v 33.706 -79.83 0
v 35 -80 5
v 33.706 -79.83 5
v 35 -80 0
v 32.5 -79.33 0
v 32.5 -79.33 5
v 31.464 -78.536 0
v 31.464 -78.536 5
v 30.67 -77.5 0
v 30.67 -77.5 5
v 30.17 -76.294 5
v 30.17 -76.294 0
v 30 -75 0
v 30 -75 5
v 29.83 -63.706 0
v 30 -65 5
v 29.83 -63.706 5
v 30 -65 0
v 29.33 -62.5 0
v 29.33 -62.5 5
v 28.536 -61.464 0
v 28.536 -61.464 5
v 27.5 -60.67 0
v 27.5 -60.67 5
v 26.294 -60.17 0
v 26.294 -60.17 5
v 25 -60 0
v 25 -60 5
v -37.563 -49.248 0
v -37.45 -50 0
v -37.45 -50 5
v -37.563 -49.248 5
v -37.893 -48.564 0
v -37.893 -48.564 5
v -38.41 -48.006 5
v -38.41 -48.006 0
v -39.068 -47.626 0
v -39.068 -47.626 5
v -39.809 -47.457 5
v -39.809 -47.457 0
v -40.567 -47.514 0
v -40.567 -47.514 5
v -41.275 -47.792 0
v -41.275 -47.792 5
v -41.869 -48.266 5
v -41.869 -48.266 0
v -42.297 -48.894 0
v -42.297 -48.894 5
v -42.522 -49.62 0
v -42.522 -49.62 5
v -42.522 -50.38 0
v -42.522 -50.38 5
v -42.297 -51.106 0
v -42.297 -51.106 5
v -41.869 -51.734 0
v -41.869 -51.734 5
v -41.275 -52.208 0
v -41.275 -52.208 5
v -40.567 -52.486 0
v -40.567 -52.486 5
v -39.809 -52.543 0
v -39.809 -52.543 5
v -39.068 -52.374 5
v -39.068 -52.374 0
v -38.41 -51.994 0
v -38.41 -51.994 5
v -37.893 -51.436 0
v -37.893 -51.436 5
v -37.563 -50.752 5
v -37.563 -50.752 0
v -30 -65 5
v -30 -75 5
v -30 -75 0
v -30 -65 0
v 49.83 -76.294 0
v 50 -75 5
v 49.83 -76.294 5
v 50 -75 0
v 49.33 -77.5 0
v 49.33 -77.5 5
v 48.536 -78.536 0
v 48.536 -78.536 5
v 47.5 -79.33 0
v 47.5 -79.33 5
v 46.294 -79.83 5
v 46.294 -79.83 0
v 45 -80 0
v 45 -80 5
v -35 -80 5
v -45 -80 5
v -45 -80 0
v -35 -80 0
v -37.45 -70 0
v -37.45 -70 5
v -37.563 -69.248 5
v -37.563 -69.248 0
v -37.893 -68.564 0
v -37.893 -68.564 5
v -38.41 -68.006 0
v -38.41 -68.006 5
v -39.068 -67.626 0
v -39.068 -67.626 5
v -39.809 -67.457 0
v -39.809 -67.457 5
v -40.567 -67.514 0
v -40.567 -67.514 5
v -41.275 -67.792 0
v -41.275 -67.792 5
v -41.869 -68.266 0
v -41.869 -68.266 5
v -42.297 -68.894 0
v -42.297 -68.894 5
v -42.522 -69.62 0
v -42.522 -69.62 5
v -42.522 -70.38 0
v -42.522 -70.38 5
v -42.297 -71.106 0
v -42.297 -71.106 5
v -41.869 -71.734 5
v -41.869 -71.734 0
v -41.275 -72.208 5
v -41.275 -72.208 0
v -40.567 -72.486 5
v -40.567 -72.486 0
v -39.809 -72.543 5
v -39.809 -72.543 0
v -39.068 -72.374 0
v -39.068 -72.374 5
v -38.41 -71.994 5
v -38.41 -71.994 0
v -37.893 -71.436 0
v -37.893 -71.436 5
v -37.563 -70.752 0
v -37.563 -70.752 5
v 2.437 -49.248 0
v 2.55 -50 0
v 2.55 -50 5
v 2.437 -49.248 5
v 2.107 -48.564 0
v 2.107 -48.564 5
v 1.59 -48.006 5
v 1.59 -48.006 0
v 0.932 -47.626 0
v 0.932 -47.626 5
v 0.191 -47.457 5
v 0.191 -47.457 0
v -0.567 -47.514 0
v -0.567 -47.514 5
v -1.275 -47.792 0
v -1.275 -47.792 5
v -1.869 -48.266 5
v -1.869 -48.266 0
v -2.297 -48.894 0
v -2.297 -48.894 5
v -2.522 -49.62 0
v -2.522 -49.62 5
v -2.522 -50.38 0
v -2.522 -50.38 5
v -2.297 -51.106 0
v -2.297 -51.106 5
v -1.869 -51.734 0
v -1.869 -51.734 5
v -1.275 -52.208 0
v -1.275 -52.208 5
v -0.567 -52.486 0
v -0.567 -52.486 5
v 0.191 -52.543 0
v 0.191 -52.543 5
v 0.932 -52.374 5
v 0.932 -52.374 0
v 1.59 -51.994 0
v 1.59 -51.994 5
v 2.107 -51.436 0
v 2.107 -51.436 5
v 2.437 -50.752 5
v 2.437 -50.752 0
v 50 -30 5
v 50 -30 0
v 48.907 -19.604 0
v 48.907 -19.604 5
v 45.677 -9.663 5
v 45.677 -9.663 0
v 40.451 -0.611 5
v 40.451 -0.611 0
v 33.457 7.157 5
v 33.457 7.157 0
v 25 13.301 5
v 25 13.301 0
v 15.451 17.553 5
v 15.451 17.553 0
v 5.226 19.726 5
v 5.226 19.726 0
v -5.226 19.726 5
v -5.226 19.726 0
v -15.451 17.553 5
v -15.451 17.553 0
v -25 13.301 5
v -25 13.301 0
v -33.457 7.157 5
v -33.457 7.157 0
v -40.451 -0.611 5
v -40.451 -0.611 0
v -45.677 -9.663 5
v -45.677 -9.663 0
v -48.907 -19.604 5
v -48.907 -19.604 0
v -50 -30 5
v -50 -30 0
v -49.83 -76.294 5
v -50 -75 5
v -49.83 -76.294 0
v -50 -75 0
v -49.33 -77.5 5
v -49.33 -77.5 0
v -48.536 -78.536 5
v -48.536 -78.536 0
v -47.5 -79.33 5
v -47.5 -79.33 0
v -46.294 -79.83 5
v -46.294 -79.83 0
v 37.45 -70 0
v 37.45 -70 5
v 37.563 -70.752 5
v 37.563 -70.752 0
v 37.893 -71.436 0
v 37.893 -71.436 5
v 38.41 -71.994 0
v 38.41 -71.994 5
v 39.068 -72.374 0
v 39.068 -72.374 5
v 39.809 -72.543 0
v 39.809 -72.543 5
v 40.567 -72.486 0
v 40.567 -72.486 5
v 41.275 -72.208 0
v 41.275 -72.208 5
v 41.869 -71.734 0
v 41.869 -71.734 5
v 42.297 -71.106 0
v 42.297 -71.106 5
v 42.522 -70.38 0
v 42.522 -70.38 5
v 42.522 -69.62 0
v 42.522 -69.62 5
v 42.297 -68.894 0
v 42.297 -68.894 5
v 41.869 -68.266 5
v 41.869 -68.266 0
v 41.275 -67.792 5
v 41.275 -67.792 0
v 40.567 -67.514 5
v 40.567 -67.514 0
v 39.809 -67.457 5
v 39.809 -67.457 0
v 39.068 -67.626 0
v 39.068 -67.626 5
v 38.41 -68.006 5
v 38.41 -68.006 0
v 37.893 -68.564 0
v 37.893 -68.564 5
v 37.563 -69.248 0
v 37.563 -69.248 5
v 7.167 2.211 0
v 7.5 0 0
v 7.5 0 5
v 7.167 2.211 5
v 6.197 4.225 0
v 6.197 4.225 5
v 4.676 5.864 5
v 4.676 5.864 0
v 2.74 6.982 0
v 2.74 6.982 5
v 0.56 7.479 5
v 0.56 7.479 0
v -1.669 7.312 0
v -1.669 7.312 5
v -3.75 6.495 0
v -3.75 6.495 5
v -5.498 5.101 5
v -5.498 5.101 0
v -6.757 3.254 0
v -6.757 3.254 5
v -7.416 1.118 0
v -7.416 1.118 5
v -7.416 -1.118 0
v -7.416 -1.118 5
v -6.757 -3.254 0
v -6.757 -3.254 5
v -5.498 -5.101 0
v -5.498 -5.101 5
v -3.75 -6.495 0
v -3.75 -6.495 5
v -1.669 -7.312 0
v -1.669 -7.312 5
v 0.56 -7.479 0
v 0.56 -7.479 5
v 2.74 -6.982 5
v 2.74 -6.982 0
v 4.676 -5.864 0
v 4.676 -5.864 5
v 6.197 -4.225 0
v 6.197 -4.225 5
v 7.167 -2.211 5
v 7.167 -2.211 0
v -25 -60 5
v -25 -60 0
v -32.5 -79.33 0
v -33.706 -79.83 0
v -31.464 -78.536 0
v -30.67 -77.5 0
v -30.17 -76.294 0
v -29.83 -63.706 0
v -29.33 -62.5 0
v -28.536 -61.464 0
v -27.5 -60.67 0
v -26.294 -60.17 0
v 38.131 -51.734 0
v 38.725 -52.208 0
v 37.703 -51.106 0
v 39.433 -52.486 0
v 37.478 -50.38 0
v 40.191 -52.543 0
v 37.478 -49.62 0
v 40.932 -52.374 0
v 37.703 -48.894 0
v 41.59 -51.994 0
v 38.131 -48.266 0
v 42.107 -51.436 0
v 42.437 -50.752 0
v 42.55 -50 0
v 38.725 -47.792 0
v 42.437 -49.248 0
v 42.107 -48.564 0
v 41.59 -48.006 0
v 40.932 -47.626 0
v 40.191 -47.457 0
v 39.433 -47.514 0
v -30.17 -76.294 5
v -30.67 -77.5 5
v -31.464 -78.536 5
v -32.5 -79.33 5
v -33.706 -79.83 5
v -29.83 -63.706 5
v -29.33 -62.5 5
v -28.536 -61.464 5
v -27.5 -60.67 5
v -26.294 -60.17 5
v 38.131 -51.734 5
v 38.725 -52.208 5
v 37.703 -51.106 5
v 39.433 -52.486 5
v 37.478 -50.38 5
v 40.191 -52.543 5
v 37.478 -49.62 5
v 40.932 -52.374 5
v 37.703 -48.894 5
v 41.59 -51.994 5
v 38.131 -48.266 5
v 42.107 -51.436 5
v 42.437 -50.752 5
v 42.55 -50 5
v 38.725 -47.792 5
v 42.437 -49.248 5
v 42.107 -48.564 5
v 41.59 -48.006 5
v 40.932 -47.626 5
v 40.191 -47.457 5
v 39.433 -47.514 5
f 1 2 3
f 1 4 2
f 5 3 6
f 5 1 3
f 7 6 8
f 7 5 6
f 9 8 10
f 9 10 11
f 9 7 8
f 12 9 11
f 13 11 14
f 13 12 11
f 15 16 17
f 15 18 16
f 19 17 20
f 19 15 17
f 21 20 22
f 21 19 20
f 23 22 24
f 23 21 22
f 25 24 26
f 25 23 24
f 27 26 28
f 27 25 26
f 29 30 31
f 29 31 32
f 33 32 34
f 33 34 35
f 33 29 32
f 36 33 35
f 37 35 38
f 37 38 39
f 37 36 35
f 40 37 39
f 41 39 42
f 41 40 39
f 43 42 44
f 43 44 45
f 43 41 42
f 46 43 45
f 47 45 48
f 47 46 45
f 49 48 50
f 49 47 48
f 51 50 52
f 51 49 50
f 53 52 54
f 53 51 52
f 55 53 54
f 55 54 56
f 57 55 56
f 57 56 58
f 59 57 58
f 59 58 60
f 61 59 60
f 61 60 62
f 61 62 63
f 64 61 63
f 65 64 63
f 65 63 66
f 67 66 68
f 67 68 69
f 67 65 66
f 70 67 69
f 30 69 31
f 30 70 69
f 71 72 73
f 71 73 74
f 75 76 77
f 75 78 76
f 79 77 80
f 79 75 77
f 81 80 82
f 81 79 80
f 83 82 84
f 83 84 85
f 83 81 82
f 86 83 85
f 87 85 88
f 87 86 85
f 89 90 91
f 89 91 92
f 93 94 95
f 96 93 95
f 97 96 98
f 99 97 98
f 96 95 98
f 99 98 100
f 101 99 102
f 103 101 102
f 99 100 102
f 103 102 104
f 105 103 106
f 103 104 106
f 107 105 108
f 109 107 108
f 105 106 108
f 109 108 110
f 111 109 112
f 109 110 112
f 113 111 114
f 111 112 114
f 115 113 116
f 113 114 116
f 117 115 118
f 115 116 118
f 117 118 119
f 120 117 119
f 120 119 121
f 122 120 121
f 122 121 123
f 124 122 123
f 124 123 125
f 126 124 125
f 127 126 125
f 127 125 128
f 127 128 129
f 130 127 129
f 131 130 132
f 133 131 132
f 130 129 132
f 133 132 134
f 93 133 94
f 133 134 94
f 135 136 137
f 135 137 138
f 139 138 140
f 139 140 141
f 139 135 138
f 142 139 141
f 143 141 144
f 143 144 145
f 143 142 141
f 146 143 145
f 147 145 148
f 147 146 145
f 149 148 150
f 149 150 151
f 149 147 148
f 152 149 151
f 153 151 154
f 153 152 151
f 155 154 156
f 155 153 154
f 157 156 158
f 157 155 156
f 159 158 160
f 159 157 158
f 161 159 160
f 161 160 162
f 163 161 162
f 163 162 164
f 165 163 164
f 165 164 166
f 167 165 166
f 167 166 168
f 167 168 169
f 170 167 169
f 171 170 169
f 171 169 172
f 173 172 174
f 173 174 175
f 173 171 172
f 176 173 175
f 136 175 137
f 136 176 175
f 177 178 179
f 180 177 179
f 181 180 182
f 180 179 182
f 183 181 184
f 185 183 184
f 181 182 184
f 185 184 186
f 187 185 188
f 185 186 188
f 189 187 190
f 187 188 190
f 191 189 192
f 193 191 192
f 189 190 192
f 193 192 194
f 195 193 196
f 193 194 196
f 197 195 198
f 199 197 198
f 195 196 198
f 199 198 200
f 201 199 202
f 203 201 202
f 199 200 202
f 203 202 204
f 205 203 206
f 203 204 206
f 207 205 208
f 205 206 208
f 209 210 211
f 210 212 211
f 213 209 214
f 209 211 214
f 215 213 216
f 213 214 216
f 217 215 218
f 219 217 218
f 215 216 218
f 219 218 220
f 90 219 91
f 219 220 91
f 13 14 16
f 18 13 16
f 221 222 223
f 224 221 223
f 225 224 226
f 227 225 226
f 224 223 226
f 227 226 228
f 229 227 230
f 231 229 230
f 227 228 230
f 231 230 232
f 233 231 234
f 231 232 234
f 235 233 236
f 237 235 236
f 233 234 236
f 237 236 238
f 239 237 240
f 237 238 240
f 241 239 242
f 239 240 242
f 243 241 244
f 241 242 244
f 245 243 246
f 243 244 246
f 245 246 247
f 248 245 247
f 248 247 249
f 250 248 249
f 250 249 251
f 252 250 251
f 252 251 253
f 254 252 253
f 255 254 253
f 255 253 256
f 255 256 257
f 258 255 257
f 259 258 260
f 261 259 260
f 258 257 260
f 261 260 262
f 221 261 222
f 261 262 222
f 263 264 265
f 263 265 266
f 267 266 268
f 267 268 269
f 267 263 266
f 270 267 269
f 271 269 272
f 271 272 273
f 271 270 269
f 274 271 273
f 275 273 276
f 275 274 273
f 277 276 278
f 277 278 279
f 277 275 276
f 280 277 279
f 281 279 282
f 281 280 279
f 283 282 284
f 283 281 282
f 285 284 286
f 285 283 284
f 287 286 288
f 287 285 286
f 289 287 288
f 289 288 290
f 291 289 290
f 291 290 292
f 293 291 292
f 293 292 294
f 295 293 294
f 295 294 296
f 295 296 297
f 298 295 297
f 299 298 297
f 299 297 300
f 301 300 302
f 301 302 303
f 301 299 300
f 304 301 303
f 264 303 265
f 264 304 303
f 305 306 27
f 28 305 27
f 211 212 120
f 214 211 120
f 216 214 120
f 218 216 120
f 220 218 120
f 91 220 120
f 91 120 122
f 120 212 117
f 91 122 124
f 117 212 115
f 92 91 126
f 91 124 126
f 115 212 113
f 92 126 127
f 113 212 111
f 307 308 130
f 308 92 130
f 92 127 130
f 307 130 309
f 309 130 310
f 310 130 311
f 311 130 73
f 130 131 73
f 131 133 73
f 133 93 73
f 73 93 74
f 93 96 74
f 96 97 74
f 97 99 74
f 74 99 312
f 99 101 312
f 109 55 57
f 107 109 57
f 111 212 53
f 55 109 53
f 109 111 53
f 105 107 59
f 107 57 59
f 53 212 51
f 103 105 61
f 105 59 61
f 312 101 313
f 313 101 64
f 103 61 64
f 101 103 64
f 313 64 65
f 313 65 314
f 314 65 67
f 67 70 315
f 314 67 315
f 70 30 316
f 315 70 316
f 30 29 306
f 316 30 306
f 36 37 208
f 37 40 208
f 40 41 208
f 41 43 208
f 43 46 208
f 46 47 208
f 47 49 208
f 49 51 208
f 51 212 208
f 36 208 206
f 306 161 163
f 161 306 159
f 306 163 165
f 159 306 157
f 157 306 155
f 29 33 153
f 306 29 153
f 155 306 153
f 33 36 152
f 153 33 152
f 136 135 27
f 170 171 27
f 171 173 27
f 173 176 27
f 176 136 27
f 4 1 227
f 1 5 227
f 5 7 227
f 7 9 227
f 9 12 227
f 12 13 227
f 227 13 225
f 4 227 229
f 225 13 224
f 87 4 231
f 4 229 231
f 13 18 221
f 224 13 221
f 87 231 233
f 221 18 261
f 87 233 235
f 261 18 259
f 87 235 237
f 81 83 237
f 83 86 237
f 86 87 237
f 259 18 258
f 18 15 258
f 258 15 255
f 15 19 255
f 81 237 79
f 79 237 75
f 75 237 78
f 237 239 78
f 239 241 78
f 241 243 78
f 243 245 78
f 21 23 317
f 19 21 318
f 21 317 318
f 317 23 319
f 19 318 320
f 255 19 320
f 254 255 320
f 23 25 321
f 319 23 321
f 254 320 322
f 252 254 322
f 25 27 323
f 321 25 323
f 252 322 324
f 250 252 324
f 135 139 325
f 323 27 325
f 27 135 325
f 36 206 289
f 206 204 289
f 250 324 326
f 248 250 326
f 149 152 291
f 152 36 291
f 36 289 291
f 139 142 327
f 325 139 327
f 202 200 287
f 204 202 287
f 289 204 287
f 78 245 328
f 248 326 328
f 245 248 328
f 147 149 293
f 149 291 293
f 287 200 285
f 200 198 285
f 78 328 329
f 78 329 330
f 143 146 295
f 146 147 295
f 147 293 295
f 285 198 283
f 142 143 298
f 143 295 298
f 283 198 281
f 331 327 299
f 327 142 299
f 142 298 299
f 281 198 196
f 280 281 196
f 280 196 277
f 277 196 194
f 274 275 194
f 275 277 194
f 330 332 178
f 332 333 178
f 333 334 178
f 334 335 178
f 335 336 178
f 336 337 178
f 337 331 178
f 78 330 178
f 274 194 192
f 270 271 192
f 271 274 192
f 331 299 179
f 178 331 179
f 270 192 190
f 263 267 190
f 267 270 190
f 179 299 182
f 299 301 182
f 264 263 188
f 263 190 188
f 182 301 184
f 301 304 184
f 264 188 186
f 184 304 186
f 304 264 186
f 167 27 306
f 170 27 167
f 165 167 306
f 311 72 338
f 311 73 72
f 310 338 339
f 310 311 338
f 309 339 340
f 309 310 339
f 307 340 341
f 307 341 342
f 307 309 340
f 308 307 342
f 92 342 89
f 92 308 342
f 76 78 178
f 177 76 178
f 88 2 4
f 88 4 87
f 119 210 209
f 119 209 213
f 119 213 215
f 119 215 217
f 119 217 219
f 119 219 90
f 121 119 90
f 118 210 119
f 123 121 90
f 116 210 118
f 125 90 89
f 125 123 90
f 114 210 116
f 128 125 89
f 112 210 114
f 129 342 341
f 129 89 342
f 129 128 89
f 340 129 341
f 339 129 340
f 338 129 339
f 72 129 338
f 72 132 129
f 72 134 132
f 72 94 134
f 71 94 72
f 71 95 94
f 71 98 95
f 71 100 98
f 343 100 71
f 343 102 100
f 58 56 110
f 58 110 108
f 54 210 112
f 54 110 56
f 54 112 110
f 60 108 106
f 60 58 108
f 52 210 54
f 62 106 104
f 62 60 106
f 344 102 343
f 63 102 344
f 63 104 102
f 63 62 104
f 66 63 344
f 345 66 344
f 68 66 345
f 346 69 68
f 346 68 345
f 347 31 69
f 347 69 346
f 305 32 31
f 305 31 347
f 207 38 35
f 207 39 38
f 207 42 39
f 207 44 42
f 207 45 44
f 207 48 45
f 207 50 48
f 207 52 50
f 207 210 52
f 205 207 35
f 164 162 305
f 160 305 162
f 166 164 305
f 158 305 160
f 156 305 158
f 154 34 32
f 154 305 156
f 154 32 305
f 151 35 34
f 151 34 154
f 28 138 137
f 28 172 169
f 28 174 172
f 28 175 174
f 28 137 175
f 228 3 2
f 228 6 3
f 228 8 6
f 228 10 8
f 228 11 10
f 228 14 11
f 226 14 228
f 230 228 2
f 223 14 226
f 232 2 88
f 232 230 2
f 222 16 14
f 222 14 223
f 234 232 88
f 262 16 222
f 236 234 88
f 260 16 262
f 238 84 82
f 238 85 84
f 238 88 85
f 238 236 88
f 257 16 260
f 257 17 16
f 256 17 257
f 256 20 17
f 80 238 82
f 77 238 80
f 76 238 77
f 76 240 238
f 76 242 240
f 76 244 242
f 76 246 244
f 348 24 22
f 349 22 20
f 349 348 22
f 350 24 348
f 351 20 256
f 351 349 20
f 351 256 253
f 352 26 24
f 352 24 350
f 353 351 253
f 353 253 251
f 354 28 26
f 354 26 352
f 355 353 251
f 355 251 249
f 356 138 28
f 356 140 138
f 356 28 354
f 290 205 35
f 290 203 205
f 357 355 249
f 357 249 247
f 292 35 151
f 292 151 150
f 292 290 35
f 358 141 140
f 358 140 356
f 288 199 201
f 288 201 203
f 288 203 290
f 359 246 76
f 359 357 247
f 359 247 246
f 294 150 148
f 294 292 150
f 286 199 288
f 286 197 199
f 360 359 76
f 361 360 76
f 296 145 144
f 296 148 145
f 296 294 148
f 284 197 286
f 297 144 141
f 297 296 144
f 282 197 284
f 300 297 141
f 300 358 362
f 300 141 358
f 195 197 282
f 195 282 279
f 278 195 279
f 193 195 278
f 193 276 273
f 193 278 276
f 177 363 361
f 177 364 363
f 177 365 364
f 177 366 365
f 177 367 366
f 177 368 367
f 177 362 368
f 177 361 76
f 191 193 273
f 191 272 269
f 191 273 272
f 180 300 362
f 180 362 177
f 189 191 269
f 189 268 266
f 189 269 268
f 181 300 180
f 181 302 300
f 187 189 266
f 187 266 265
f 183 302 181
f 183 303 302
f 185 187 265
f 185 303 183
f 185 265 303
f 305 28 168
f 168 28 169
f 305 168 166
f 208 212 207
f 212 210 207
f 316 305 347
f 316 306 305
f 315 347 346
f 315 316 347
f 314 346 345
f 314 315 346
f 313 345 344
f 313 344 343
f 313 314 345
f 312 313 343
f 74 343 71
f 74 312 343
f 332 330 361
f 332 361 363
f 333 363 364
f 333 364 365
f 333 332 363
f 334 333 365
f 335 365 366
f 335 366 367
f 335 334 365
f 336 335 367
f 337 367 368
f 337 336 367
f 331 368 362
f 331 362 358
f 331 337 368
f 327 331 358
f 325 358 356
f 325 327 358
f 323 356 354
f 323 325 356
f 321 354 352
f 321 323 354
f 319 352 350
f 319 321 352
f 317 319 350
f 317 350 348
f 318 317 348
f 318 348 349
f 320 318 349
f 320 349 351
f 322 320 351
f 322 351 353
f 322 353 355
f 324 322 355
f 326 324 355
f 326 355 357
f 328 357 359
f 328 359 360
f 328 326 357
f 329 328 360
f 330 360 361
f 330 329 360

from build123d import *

# Parameters (mm, degrees)
SKETCH_1_R      = 7.5
SKETCH_1_R_2    = 2.55
EXTRUDE_1_DEPTH = 5
SKETCH_2_W      = 20
SKETCH_2_H      = 20
SKETCH_2_R      = 2.55
EXTRUDE_2_DEPTH = 5
FILLET_1_R      = 5


with BuildPart() as part:
    # ｽｹｯﾁ1 → ﾎﾞｽ - 押し出し1 (new body)
    with BuildSketch(Plane.XY):
        with BuildLine():
            Line((-50, -60), (50, -60))
            Line((50, -60), (50, -30))
            ThreePointArc((50, -30), (0, 20), (-50, -30))
            Line((-50, -30), (-50, -60))
        make_face()
        Circle(SKETCH_1_R, mode=Mode.SUBTRACT)
        with Locations((-40, -50)):
            Circle(SKETCH_1_R_2, mode=Mode.SUBTRACT)
        with Locations((0, -50)):
            Circle(SKETCH_1_R_2, mode=Mode.SUBTRACT)
        with Locations((40, -50)):
            Circle(SKETCH_1_R_2, mode=Mode.SUBTRACT)
    extrude(amount=EXTRUDE_1_DEPTH)

    # ｽｹｯﾁ2 → ﾎﾞｽ - 押し出し2 (add)
    # profile 1 of 2: a face of its own
    with BuildSketch(Plane.XY.offset(5)):
        with Locations((-40, -70)):
            Rectangle(SKETCH_2_W, SKETCH_2_H)
        with Locations((-40, -70)):
            Circle(SKETCH_2_R, mode=Mode.SUBTRACT)
    # profile 2 of 2: a face of its own
    with BuildSketch(Plane.XY.offset(5)):
        with Locations((40, -70)):
            Rectangle(SKETCH_2_W, SKETCH_2_H)
        with Locations(Location((40, -70, 0), (0, 0, 180))):
            Circle(SKETCH_2_R, mode=Mode.SUBTRACT)
    extrude(amount=-EXTRUDE_2_DEPTH)

    # ﾌｨﾚｯﾄ1
    fillet_1_edges = [part.edges().sort_by_distance(p)[0] for p in [
        (-50, -80, 2.5),
        (-30, -60, 2.5),
        (-30, -80, 2.5),
        (30, -60, 2.5),
        (50, -80, 2.5),
        (30, -80, 2.5),
    ]]
    fillet(fillet_1_edges, radius=FILLET_1_R)


solid = part.part
